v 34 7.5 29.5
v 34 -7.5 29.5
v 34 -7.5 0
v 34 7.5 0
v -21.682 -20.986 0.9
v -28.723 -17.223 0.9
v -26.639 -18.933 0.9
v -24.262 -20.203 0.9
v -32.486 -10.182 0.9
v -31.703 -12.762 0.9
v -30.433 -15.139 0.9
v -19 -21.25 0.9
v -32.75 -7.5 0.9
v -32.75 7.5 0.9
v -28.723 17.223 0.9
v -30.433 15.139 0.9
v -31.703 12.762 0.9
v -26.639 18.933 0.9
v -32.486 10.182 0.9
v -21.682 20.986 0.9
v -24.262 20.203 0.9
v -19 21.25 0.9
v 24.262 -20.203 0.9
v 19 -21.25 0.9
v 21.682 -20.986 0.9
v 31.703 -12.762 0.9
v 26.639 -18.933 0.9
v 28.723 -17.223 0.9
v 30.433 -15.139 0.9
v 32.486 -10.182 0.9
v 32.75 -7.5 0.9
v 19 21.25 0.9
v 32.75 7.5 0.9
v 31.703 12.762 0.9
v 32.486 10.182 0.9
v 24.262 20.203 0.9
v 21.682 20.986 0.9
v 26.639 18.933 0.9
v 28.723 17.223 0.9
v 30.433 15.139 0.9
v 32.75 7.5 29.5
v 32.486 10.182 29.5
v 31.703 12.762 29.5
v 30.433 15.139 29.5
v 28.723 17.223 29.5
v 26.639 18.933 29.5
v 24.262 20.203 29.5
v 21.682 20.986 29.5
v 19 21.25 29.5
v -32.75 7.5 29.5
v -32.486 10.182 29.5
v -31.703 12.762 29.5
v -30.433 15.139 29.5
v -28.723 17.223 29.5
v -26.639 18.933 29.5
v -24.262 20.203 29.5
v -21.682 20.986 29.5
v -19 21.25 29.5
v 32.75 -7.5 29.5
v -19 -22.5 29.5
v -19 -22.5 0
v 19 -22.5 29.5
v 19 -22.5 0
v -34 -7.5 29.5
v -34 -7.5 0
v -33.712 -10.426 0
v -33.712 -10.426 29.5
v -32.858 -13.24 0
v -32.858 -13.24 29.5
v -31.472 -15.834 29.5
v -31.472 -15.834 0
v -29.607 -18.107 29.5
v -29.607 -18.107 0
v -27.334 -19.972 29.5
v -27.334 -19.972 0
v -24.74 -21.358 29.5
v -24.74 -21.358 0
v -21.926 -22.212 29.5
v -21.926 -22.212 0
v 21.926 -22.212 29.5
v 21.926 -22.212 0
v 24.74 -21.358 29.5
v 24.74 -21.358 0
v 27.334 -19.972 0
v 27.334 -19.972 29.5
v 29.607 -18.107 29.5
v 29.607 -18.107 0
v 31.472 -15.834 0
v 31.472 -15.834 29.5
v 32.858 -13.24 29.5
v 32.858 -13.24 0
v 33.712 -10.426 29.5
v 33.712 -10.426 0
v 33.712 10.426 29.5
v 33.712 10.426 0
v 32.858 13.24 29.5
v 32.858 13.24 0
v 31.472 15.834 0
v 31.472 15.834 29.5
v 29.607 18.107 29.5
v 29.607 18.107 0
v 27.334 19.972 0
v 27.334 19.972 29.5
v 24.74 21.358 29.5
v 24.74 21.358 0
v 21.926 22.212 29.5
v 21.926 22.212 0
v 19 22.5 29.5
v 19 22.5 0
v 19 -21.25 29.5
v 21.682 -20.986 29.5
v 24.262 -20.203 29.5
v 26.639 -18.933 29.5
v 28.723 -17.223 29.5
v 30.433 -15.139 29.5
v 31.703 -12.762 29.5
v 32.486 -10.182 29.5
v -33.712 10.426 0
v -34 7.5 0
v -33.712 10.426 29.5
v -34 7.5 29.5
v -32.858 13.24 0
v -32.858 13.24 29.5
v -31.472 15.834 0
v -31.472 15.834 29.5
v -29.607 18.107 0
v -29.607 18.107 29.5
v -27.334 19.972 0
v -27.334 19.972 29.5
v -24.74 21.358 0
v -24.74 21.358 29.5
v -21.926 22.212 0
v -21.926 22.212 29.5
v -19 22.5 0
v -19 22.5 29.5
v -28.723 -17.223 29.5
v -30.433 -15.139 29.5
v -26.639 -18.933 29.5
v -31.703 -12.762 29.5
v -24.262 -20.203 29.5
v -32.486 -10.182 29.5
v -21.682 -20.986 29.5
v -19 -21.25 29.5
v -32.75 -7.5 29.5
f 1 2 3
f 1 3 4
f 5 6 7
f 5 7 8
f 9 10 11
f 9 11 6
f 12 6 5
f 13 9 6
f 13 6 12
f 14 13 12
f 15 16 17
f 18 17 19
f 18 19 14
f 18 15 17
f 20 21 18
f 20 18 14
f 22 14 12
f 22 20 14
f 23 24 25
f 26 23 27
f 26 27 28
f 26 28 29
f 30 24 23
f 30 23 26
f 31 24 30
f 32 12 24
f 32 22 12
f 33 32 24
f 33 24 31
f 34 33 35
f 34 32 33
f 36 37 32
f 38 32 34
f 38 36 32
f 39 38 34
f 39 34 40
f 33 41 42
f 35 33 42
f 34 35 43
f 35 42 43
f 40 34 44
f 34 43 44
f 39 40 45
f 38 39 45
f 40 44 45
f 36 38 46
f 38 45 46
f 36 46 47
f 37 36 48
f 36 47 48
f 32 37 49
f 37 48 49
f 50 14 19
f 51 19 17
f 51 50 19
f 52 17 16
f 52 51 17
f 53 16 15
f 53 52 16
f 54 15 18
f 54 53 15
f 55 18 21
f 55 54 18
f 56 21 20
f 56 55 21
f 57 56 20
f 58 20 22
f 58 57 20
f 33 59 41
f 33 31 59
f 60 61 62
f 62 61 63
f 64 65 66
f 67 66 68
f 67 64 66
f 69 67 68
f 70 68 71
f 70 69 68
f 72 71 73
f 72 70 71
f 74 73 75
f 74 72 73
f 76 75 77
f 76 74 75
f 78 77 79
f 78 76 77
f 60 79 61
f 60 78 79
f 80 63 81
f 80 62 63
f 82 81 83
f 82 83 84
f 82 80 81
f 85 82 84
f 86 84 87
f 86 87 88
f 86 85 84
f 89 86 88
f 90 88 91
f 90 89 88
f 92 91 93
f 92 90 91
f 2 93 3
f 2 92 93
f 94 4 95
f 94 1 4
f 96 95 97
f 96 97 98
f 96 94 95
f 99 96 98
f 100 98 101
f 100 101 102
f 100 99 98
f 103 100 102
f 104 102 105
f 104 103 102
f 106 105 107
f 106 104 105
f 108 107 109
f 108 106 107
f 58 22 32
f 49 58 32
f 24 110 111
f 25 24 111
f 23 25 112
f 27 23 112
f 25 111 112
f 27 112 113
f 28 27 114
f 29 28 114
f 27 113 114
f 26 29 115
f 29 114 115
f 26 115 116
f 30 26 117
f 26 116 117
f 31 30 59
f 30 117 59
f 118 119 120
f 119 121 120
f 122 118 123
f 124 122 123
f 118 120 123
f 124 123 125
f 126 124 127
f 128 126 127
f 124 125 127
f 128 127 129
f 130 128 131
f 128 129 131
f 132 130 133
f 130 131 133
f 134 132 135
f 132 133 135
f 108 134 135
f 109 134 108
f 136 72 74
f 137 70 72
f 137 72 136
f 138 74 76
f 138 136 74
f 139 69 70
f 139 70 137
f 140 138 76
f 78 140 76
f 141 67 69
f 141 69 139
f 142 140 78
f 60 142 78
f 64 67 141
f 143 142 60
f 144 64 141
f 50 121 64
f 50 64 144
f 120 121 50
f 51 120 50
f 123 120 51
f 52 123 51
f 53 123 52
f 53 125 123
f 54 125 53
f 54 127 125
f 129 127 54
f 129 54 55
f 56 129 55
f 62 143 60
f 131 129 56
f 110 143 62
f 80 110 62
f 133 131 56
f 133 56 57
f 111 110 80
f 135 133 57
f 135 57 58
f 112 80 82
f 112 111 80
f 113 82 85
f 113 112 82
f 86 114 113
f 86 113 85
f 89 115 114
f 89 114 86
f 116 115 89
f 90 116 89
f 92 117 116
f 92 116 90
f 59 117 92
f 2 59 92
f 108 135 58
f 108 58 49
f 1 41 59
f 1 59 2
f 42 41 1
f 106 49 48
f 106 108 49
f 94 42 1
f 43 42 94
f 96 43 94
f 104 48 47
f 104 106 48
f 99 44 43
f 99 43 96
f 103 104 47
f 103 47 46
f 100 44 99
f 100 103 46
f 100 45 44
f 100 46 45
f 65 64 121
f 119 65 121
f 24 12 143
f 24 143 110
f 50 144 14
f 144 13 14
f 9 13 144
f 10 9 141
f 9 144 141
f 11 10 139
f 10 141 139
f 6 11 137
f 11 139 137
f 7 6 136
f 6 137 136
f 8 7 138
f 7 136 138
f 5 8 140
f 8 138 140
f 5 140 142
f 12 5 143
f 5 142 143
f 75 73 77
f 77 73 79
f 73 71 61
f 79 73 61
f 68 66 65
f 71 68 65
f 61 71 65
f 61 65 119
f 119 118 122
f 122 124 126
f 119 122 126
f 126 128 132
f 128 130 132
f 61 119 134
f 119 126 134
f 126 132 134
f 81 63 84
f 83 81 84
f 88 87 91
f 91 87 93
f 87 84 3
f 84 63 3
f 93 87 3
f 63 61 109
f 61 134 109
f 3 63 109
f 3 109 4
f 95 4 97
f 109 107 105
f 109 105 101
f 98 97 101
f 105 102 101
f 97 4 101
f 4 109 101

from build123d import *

# Parameters (mm, degrees)
F2_W     = 68
F2_H     = 45
F3_DEPTH = 29.5
F4_R     = 15
F5_T     = -1.25
F6_DEPTH = 0.35


with BuildPart() as f3:
    # F2 (on Top) → F3 (new body)
    with BuildSketch(Plane.XY):
        Rectangle(F2_W, F2_H)
    extrude(amount=F3_DEPTH)

    # F4
    f4_edges = [f3.edges().sort_by_distance(p)[0] for p in [
        (34, -22.5, 14.75),
        (34, 22.5, 14.75),
        (-34, -22.5, 14.75),
        (-34, 22.5, 14.75),
    ]]
    fillet(f4_edges, radius=F4_R)

    # F5
    f5_openings = [f3.faces().sort_by_distance(p)[0] for p in [
        (0, 0, 29.5),
    ]]
    offset(amount=F5_T, openings=f5_openings)

    # F6 (cut): a face of the model
    f6_faces = [f3.faces().sort_by_distance(p)[0] for p in [
        (0, 0, 1.25),
    ]]
    extrude(f6_faces, amount=-F6_DEPTH, mode=Mode.SUBTRACT)


solid = f3.part
